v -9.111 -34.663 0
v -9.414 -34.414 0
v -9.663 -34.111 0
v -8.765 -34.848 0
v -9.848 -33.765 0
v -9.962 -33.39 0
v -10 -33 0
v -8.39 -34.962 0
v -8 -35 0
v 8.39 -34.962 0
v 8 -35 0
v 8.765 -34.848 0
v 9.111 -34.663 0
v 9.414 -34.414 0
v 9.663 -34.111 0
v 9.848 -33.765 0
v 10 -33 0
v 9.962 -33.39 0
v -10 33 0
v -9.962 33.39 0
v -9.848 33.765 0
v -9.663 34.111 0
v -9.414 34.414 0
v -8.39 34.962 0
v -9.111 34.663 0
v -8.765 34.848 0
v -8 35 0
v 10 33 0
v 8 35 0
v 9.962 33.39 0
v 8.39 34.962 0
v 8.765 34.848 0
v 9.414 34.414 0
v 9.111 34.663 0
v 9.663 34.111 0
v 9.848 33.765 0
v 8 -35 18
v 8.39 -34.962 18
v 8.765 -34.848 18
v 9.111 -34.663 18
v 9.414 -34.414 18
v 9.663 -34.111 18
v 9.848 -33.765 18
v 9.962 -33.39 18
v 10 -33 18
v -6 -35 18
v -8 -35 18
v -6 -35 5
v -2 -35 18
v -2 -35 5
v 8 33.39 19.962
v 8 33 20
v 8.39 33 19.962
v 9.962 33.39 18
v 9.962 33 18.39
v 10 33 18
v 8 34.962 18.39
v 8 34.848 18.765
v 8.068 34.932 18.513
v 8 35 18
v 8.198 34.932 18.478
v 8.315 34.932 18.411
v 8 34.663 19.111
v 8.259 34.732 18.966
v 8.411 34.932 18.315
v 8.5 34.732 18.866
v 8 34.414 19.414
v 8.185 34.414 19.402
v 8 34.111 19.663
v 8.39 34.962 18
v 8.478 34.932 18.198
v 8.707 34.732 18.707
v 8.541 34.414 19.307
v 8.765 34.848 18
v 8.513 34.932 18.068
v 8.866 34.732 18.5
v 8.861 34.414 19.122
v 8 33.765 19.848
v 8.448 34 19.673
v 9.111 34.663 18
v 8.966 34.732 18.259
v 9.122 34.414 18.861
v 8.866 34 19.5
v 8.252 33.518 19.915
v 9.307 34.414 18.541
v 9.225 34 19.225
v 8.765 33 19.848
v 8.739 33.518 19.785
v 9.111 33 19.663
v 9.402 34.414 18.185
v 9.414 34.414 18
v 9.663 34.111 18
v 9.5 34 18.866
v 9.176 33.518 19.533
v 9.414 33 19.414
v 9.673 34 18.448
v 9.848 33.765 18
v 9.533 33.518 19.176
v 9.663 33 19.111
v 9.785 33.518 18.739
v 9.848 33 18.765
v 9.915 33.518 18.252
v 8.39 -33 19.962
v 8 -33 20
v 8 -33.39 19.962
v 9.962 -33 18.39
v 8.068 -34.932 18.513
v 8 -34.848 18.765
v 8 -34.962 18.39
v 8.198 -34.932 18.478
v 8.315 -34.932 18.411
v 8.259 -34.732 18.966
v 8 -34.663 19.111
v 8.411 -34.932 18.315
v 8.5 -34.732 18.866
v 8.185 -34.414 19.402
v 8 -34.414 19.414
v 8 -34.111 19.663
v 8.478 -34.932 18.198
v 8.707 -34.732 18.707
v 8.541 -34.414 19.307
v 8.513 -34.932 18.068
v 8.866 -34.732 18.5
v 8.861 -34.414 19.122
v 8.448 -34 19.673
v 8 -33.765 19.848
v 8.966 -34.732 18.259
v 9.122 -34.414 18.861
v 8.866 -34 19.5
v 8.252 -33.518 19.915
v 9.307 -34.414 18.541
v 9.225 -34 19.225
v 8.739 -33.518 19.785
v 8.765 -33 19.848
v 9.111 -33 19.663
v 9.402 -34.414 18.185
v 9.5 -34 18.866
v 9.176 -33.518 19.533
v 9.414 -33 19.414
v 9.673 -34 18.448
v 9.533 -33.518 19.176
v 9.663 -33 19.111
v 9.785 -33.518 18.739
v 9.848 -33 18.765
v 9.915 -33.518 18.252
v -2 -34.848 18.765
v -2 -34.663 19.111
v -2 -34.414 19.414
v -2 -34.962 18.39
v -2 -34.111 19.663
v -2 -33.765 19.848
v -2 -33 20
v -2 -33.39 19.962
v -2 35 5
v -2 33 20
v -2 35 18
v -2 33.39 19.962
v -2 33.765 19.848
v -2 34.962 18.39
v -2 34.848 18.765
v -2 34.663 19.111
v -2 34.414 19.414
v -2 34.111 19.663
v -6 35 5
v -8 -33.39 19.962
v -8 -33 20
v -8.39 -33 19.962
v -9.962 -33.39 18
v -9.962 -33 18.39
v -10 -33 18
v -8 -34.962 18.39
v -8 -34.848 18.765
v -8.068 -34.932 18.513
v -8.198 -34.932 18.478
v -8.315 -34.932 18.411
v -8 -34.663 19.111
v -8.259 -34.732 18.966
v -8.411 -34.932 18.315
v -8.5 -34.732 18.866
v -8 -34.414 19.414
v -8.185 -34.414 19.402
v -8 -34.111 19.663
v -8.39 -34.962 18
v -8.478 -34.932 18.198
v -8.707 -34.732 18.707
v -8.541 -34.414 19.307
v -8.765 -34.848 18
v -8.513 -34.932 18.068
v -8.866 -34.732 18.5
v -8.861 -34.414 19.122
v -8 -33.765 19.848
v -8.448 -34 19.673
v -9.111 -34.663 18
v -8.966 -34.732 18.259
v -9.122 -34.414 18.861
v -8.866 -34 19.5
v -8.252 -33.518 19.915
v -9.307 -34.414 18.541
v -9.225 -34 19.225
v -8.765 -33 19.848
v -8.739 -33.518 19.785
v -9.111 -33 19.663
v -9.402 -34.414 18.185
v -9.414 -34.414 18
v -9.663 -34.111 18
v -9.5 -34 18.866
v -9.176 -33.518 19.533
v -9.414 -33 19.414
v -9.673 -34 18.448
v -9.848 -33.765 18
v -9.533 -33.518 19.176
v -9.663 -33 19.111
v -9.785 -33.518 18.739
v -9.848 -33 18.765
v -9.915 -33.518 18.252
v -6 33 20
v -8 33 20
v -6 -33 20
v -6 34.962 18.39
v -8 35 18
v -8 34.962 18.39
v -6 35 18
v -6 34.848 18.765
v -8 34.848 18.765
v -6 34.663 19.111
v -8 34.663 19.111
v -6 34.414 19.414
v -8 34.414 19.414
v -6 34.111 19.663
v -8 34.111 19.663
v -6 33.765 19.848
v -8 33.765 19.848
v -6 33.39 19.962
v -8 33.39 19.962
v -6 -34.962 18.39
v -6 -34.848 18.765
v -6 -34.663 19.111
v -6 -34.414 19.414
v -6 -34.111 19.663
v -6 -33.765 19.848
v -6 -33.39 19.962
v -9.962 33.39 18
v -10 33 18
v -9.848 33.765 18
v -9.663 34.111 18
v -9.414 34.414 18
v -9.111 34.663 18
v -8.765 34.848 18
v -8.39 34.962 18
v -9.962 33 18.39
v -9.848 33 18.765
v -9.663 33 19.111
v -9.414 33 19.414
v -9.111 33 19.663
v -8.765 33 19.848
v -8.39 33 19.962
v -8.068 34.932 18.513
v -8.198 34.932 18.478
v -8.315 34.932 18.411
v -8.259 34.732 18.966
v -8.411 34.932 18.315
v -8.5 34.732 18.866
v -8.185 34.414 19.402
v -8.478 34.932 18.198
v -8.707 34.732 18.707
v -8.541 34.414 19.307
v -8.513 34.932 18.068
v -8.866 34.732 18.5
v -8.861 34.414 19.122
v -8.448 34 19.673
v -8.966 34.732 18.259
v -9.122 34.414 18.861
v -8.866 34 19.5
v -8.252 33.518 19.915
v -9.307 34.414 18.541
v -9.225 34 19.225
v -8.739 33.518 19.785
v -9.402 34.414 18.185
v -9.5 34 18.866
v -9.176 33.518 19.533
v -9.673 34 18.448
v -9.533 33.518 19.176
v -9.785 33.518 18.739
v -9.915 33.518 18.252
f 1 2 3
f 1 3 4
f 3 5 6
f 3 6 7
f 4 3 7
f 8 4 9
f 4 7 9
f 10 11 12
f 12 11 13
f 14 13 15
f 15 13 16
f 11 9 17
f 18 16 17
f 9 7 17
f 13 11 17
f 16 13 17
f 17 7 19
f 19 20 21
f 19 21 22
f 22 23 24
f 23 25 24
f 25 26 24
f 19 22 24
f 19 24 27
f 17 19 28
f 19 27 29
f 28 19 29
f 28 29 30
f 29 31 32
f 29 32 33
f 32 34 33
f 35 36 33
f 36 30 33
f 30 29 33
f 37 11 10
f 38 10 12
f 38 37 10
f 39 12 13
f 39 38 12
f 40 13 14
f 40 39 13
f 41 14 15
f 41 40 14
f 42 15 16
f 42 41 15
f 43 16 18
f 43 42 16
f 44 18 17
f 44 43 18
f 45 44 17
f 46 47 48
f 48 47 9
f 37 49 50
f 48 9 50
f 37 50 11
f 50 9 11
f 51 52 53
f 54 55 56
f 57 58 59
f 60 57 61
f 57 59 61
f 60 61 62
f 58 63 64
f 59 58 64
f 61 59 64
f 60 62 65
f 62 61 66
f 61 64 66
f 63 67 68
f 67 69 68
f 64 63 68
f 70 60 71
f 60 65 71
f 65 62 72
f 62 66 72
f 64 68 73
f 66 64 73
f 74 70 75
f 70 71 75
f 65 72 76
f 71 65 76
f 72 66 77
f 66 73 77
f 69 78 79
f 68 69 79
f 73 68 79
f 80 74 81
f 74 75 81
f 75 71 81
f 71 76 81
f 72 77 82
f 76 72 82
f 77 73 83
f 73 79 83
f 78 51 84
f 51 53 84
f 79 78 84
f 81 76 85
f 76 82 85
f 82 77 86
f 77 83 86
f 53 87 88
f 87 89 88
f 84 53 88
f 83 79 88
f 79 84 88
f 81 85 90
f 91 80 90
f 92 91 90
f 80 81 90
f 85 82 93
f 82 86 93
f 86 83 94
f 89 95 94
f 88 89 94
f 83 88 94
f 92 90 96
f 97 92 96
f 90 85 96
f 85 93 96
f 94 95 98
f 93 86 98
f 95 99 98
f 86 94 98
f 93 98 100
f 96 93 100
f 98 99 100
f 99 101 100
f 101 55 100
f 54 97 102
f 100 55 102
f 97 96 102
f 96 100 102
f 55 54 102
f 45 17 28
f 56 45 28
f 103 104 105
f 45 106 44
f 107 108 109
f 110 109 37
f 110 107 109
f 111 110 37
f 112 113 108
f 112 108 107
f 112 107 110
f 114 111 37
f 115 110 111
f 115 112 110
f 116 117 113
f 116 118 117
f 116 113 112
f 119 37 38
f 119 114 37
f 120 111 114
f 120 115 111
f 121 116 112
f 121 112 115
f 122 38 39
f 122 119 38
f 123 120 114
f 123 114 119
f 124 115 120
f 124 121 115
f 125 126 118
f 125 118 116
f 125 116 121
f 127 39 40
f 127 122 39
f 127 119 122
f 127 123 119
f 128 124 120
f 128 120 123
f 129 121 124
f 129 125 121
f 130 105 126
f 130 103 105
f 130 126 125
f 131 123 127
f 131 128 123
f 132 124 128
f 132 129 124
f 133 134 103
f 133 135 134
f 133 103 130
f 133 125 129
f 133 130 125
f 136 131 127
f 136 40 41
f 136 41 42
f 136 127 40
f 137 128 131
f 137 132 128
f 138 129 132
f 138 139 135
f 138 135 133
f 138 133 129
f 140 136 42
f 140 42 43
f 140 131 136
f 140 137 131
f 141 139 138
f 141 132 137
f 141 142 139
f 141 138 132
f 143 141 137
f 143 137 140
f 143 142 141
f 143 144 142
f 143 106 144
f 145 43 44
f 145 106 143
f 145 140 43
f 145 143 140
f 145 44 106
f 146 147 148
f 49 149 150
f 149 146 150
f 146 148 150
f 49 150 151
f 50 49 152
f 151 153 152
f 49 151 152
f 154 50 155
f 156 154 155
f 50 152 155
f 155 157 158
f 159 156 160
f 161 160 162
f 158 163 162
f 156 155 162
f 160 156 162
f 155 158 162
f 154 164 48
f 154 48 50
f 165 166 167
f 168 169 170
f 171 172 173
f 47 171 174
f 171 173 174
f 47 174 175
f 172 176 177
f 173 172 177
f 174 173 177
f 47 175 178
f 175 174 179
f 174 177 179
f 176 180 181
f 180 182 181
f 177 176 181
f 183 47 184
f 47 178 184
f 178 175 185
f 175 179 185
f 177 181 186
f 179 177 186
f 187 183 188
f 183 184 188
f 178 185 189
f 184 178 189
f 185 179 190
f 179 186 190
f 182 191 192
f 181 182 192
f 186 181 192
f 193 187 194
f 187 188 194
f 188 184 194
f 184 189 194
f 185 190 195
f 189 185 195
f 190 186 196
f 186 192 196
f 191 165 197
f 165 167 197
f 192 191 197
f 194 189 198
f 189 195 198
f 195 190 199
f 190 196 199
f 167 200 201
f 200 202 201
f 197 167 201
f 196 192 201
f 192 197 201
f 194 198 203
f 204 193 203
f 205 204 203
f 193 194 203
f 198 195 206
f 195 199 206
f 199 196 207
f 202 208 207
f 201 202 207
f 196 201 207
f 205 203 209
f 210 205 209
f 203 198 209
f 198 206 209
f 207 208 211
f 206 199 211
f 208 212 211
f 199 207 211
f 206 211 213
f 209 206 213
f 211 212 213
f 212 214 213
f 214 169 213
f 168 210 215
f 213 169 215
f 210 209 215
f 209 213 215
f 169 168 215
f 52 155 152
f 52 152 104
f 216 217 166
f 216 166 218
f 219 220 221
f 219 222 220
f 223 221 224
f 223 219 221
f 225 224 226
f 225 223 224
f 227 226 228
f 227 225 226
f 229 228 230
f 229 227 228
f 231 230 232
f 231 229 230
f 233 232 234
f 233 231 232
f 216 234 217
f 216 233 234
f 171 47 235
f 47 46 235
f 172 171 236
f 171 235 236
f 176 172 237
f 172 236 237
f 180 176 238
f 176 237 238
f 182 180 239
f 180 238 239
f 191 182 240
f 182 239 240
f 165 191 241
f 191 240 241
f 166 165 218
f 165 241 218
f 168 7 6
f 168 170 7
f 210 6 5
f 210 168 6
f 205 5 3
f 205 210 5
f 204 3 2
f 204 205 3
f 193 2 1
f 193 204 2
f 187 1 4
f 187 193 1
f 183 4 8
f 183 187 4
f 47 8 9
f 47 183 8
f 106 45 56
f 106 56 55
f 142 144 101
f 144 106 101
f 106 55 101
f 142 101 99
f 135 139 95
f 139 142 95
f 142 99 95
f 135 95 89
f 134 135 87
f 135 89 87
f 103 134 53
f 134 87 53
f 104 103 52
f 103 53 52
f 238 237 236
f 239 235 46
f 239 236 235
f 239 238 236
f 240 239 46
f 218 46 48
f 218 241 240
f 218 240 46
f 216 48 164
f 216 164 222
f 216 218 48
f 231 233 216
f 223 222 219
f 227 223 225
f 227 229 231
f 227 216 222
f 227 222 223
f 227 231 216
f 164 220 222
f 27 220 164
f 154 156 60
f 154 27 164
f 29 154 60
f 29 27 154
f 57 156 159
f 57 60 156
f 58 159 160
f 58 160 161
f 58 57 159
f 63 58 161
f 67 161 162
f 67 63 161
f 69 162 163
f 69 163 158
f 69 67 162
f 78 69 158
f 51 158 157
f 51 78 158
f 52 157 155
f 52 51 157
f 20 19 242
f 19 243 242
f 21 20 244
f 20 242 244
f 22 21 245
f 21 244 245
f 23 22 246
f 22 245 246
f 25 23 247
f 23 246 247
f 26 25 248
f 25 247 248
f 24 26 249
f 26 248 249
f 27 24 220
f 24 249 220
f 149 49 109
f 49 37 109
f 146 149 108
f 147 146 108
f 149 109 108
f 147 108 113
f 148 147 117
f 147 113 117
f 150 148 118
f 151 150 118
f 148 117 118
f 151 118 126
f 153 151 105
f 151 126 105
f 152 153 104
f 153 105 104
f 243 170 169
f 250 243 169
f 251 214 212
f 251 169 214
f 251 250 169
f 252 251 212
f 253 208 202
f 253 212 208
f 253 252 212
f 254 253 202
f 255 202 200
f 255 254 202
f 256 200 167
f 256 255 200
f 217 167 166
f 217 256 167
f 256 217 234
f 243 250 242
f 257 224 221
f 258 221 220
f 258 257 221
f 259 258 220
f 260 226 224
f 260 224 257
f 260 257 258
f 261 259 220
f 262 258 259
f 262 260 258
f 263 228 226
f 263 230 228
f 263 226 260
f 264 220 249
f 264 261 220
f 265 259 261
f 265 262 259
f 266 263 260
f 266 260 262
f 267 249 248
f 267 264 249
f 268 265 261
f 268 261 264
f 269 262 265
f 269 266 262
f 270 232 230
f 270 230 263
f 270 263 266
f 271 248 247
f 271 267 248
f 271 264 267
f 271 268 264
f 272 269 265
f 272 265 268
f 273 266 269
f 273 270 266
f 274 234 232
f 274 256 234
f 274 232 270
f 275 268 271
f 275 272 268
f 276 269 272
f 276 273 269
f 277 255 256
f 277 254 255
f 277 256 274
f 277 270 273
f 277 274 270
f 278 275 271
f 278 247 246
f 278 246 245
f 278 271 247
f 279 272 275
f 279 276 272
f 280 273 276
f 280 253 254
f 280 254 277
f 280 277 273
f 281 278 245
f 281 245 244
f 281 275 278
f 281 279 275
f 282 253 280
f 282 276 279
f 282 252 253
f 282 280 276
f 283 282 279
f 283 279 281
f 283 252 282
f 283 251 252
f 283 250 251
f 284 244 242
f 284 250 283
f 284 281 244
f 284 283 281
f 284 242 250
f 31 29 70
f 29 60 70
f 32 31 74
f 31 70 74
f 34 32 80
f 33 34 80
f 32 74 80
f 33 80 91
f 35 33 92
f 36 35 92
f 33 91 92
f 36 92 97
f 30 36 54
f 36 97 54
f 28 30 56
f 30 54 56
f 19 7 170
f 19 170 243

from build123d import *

# Parameters (mm, degrees)
F0_W     = 20
F0_H     = 70
F1_DEPTH = 20
F2_W     = 4
F2_H     = 70
F3_DEPTH = 15
F4_R     = 2


with BuildPart() as f1:
    # F0 (on Top) → F1 (new body)
    with BuildSketch(Plane.XY):
        Rectangle(F0_W, F0_H)
    extrude(amount=F1_DEPTH)

    # F2 (on face) → F3 (cut)
    with BuildSketch(Plane.XY.offset(20)):
        with Locations((-4, 0)):
            Rectangle(F2_W, F2_H)
    extrude(amount=-F3_DEPTH, mode=Mode.SUBTRACT)

    # F4
    f4_edges = [f1.edges().sort_by_distance(p)[0] for p in [
        (10, 0, 20),
        (-10, 0, 20),
        (4, -35, 20),
        (-8, -35, 20),
        (4, 35, 20),
        (-8, 35, 20),
        (10, -35, 10),
        (-10, -35, 10),
        (10, 35, 10),
        (-10, 35, 10),
    ]]
    fillet(f4_edges, radius=F4_R)


solid = f1.part
